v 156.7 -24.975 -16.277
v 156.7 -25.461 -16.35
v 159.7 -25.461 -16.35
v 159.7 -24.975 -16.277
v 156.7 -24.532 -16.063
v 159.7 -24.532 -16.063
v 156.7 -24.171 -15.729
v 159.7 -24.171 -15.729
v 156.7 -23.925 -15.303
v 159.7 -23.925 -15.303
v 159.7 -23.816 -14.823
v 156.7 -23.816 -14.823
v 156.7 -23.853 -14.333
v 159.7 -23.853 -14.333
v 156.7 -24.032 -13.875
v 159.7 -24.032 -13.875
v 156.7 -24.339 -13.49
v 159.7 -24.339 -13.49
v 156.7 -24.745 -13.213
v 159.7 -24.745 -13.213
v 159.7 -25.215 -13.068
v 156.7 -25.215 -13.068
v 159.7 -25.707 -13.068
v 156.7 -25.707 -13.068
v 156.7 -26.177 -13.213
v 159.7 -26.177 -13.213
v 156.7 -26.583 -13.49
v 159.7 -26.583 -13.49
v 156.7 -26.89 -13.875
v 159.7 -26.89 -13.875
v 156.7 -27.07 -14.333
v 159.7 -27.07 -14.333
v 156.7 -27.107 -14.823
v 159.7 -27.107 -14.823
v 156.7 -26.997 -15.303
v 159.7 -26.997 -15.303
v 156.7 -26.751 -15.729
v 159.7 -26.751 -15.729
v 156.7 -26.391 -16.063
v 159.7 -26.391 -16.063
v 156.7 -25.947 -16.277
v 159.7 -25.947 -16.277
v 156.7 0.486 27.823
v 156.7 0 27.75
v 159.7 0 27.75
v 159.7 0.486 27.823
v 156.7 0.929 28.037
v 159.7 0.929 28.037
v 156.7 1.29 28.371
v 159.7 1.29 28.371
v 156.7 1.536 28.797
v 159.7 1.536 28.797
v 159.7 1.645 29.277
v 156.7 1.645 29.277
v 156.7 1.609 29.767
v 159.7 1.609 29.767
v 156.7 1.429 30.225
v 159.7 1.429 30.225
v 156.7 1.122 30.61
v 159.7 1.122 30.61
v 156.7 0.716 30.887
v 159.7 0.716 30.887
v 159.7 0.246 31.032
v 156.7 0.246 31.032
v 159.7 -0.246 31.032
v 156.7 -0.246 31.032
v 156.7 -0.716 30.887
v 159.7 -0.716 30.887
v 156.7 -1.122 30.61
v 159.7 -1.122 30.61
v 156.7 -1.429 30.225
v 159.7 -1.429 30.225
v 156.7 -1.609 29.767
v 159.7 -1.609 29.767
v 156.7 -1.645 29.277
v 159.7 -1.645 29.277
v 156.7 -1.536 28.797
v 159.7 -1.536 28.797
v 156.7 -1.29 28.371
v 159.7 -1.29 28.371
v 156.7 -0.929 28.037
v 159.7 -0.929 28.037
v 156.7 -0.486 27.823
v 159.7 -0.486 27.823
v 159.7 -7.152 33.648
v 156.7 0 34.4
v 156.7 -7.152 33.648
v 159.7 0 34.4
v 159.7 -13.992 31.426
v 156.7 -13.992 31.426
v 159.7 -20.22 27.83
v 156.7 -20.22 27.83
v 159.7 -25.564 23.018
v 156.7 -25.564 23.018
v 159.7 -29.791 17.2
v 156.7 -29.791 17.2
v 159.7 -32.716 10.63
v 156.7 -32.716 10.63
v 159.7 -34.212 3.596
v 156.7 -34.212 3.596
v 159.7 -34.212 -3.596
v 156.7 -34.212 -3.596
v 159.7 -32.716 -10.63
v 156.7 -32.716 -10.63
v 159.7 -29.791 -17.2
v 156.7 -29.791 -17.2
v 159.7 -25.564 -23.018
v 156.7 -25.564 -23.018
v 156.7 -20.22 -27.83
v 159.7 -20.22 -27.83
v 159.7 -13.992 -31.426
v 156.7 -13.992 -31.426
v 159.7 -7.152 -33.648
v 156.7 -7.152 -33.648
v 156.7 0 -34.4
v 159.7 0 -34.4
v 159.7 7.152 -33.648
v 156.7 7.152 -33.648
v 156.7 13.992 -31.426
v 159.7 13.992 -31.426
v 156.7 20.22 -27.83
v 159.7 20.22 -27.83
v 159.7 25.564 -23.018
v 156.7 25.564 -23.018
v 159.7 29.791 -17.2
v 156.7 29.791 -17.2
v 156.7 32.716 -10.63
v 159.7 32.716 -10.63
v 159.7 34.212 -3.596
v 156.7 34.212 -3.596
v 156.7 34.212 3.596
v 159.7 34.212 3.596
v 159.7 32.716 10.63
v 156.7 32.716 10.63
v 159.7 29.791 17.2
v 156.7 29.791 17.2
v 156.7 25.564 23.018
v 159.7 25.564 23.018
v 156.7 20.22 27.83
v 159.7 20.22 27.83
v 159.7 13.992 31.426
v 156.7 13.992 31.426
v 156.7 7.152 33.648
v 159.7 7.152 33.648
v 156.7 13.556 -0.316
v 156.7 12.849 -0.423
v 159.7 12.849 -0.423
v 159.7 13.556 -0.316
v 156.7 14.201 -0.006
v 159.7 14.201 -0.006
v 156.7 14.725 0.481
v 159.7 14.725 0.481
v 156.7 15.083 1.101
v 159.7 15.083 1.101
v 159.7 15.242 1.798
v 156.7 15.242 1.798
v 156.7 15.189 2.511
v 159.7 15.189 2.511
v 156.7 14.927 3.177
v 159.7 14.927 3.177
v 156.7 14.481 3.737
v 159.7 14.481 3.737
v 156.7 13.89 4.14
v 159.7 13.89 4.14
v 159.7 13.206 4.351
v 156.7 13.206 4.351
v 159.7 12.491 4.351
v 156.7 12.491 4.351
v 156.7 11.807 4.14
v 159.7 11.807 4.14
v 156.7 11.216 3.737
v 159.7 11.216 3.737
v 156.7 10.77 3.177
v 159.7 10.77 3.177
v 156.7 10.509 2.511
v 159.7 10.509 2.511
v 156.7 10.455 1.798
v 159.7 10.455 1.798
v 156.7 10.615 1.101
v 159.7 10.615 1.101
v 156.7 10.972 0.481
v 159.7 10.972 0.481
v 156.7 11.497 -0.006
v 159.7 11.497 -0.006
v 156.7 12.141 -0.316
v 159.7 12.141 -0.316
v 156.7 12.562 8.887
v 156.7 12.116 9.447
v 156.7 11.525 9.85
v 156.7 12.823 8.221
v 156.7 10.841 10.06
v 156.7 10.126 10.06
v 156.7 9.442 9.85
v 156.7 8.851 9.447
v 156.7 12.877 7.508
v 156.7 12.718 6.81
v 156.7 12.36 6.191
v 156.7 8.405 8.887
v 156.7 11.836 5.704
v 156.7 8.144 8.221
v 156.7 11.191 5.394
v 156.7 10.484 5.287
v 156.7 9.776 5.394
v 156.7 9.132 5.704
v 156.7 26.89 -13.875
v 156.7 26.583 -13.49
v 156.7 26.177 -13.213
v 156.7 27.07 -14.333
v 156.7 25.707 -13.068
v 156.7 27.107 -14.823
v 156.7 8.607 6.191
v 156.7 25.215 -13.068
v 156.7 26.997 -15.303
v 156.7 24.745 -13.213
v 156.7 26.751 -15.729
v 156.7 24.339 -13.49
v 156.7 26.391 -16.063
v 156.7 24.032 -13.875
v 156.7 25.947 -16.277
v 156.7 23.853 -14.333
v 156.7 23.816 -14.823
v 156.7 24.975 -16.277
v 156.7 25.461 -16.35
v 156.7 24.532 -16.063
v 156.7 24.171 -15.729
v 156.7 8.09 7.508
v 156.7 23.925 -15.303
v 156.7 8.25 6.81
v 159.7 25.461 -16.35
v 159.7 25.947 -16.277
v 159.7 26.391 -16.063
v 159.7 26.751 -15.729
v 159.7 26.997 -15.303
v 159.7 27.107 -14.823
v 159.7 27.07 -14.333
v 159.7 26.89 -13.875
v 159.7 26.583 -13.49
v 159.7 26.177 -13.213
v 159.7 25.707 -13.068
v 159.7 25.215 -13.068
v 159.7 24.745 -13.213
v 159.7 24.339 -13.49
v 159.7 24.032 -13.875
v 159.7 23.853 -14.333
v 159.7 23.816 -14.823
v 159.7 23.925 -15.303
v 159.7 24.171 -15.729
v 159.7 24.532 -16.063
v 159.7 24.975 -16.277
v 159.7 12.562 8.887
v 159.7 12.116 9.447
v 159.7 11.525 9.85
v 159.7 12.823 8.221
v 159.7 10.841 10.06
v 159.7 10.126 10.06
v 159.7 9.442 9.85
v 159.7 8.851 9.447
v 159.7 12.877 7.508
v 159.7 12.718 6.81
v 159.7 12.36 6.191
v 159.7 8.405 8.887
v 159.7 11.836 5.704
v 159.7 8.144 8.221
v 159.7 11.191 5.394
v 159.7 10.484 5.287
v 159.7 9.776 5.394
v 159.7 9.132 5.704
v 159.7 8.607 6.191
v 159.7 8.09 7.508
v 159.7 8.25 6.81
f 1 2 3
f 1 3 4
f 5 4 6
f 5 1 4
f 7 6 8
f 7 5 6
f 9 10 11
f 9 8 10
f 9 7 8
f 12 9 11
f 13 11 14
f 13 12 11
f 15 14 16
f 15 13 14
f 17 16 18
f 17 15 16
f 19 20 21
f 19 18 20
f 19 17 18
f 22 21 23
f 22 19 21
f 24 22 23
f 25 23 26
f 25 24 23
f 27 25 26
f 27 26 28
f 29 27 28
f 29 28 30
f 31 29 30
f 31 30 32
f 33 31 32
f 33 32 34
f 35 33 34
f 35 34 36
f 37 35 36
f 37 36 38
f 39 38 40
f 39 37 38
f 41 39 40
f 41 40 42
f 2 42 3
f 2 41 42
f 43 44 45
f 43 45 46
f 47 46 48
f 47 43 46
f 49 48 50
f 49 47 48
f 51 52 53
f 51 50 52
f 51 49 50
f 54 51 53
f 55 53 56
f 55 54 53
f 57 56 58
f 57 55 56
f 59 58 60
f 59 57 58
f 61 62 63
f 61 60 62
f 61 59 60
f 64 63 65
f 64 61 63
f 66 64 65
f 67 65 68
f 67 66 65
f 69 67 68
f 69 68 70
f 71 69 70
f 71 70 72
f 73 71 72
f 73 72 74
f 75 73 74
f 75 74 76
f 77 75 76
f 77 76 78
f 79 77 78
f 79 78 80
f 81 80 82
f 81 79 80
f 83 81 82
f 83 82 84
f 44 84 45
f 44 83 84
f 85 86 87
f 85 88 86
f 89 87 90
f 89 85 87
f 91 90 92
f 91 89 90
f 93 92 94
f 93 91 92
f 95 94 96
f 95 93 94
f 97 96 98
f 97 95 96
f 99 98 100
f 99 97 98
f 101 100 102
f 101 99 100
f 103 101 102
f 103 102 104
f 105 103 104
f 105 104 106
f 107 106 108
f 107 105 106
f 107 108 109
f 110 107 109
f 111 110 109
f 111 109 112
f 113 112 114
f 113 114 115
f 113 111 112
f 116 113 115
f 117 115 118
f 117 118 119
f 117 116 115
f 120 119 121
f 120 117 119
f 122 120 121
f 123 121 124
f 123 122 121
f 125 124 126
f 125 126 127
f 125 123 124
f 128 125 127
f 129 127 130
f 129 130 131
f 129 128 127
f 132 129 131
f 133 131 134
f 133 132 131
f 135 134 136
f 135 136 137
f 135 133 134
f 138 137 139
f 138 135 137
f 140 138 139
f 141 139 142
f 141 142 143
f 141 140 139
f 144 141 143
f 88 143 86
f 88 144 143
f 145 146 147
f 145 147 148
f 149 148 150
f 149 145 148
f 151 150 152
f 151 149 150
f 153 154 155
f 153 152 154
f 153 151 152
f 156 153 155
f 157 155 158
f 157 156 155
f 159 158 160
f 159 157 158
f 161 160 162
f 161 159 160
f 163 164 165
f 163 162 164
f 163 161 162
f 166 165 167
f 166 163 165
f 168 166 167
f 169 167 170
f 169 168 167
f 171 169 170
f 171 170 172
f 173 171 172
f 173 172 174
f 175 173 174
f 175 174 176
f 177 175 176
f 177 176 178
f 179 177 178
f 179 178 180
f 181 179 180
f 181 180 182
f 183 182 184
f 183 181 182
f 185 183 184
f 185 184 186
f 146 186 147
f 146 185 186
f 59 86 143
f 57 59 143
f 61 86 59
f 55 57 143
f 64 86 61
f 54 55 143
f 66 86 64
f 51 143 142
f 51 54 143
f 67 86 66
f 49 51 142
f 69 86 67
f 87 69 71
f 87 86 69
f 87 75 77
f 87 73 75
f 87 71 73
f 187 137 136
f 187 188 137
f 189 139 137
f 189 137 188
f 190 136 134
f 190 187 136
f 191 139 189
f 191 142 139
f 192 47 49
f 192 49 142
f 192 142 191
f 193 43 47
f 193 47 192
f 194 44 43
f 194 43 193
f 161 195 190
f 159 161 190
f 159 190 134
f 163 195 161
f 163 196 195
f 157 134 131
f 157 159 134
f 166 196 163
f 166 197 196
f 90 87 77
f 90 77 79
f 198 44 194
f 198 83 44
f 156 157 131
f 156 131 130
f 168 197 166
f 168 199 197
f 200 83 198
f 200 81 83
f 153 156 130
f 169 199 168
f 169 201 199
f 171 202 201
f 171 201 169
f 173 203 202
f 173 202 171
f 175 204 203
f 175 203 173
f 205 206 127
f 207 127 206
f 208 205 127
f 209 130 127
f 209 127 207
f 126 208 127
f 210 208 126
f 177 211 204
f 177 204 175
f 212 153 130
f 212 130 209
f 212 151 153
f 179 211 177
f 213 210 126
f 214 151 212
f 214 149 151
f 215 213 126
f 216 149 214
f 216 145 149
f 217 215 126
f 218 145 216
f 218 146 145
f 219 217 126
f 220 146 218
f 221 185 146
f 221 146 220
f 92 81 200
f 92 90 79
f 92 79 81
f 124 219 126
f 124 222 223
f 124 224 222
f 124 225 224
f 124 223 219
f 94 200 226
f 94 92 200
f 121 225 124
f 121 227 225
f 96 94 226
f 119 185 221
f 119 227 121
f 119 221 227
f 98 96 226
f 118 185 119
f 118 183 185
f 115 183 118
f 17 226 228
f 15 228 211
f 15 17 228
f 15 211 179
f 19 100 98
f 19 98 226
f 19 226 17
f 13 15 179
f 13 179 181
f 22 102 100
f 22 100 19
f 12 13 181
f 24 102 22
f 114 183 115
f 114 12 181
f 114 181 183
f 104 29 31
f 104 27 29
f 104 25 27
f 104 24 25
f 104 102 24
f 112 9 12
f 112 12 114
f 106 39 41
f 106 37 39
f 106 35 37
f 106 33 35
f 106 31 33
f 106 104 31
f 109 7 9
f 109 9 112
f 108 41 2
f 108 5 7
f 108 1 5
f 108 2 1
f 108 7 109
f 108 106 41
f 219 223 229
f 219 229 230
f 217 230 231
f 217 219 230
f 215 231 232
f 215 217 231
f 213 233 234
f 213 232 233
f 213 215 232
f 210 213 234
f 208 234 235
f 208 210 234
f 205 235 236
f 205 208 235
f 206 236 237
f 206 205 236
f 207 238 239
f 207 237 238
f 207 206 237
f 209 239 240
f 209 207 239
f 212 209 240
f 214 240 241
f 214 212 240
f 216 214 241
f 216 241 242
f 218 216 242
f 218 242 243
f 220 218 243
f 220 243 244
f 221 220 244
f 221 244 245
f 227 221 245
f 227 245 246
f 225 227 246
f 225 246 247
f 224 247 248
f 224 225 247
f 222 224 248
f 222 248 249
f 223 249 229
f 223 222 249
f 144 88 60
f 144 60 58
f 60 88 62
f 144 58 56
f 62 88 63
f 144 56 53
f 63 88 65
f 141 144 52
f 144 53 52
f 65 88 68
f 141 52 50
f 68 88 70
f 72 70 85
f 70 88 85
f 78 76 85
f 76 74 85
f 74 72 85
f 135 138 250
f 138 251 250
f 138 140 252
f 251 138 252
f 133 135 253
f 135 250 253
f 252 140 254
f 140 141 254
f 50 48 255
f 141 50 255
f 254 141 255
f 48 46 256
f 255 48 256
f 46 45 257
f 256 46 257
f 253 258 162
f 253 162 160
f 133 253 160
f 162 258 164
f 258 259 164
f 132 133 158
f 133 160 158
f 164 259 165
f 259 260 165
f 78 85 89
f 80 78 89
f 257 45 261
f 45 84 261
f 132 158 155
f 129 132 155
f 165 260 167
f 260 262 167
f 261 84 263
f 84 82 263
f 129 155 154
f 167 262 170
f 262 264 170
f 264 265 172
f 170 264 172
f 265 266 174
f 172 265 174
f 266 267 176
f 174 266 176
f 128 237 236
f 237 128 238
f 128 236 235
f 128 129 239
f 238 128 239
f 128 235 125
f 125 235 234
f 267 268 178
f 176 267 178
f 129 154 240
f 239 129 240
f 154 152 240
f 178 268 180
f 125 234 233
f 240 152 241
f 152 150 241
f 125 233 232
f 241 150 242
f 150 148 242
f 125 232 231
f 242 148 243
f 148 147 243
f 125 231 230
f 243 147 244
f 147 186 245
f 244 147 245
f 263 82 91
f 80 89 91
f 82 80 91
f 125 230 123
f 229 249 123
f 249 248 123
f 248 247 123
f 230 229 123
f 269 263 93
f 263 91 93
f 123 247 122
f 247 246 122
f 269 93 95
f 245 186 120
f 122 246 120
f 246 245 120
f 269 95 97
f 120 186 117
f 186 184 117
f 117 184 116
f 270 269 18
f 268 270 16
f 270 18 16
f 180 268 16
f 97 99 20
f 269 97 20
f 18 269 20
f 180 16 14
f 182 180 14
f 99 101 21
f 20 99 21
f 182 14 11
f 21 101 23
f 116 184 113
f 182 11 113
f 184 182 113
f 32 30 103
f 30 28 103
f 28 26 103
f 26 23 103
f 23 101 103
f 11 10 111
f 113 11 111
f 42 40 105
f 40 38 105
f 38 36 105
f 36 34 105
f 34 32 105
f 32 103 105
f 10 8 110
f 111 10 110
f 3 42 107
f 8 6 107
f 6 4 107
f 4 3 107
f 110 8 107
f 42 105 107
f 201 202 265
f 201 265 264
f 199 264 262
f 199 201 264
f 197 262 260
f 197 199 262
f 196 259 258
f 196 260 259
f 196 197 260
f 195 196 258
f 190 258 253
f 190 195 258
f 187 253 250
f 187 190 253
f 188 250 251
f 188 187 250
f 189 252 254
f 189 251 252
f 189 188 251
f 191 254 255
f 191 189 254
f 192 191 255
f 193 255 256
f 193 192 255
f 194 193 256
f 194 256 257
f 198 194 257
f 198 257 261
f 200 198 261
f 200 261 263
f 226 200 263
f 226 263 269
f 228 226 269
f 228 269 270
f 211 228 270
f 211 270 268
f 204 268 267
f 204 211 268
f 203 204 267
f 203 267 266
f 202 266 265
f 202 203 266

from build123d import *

# Parameters (mm, degrees)
AXIAL_PROFILE_MM_W     = 3
AXIAL_PROFILE_MM_H     = 34.4
AXIAL_HOLES_DEPTH      = 167.945530039
AXIAL_HOLES_DEPTH_BACK = 167.945530039
SKETCH2_R              = 2.4
SKETCH2_R_2            = 1.65


with BuildPart() as part:
    # Axial profile (mm) → Full revolution (revolve)
    with BuildSketch(Plane.XY, mode=Mode.PRIVATE) as full_revolution_sk:
        with Locations((158.2, 17.2)):
            Rectangle(AXIAL_PROFILE_MM_W, AXIAL_PROFILE_MM_H)
    revolve(full_revolution_sk.sketch.rotate(Axis((-110, 0, 0), (1, 0, 0)), 90), axis=Axis((-110, 0, 0), (1, 0, 0)))

    # Sketch2 → Axial holes (cut, two sides: drawn at the far end of the back side and taken through both)
    with BuildSketch(Plane(origin=(0, 0, 0), x_dir=(0, 0, -1), z_dir=(1, 0, 0)).offset(-AXIAL_HOLES_DEPTH_BACK)):
        with Locations((-1.977382665, 12.848733704)):
            Circle(SKETCH2_R)
        with Locations((-7.687206041, 10.483647423)):
            Circle(SKETCH2_R)
        with Locations((-29.4, 0)):
            Circle(SKETCH2_R_2)
        with Locations((14.7, -25.461146871)):
            Circle(SKETCH2_R_2)
        with Locations((14.7, 25.461146871)):
            Circle(SKETCH2_R_2)
    extrude(amount=AXIAL_HOLES_DEPTH + AXIAL_HOLES_DEPTH_BACK, mode=Mode.SUBTRACT)


solid = part.part
